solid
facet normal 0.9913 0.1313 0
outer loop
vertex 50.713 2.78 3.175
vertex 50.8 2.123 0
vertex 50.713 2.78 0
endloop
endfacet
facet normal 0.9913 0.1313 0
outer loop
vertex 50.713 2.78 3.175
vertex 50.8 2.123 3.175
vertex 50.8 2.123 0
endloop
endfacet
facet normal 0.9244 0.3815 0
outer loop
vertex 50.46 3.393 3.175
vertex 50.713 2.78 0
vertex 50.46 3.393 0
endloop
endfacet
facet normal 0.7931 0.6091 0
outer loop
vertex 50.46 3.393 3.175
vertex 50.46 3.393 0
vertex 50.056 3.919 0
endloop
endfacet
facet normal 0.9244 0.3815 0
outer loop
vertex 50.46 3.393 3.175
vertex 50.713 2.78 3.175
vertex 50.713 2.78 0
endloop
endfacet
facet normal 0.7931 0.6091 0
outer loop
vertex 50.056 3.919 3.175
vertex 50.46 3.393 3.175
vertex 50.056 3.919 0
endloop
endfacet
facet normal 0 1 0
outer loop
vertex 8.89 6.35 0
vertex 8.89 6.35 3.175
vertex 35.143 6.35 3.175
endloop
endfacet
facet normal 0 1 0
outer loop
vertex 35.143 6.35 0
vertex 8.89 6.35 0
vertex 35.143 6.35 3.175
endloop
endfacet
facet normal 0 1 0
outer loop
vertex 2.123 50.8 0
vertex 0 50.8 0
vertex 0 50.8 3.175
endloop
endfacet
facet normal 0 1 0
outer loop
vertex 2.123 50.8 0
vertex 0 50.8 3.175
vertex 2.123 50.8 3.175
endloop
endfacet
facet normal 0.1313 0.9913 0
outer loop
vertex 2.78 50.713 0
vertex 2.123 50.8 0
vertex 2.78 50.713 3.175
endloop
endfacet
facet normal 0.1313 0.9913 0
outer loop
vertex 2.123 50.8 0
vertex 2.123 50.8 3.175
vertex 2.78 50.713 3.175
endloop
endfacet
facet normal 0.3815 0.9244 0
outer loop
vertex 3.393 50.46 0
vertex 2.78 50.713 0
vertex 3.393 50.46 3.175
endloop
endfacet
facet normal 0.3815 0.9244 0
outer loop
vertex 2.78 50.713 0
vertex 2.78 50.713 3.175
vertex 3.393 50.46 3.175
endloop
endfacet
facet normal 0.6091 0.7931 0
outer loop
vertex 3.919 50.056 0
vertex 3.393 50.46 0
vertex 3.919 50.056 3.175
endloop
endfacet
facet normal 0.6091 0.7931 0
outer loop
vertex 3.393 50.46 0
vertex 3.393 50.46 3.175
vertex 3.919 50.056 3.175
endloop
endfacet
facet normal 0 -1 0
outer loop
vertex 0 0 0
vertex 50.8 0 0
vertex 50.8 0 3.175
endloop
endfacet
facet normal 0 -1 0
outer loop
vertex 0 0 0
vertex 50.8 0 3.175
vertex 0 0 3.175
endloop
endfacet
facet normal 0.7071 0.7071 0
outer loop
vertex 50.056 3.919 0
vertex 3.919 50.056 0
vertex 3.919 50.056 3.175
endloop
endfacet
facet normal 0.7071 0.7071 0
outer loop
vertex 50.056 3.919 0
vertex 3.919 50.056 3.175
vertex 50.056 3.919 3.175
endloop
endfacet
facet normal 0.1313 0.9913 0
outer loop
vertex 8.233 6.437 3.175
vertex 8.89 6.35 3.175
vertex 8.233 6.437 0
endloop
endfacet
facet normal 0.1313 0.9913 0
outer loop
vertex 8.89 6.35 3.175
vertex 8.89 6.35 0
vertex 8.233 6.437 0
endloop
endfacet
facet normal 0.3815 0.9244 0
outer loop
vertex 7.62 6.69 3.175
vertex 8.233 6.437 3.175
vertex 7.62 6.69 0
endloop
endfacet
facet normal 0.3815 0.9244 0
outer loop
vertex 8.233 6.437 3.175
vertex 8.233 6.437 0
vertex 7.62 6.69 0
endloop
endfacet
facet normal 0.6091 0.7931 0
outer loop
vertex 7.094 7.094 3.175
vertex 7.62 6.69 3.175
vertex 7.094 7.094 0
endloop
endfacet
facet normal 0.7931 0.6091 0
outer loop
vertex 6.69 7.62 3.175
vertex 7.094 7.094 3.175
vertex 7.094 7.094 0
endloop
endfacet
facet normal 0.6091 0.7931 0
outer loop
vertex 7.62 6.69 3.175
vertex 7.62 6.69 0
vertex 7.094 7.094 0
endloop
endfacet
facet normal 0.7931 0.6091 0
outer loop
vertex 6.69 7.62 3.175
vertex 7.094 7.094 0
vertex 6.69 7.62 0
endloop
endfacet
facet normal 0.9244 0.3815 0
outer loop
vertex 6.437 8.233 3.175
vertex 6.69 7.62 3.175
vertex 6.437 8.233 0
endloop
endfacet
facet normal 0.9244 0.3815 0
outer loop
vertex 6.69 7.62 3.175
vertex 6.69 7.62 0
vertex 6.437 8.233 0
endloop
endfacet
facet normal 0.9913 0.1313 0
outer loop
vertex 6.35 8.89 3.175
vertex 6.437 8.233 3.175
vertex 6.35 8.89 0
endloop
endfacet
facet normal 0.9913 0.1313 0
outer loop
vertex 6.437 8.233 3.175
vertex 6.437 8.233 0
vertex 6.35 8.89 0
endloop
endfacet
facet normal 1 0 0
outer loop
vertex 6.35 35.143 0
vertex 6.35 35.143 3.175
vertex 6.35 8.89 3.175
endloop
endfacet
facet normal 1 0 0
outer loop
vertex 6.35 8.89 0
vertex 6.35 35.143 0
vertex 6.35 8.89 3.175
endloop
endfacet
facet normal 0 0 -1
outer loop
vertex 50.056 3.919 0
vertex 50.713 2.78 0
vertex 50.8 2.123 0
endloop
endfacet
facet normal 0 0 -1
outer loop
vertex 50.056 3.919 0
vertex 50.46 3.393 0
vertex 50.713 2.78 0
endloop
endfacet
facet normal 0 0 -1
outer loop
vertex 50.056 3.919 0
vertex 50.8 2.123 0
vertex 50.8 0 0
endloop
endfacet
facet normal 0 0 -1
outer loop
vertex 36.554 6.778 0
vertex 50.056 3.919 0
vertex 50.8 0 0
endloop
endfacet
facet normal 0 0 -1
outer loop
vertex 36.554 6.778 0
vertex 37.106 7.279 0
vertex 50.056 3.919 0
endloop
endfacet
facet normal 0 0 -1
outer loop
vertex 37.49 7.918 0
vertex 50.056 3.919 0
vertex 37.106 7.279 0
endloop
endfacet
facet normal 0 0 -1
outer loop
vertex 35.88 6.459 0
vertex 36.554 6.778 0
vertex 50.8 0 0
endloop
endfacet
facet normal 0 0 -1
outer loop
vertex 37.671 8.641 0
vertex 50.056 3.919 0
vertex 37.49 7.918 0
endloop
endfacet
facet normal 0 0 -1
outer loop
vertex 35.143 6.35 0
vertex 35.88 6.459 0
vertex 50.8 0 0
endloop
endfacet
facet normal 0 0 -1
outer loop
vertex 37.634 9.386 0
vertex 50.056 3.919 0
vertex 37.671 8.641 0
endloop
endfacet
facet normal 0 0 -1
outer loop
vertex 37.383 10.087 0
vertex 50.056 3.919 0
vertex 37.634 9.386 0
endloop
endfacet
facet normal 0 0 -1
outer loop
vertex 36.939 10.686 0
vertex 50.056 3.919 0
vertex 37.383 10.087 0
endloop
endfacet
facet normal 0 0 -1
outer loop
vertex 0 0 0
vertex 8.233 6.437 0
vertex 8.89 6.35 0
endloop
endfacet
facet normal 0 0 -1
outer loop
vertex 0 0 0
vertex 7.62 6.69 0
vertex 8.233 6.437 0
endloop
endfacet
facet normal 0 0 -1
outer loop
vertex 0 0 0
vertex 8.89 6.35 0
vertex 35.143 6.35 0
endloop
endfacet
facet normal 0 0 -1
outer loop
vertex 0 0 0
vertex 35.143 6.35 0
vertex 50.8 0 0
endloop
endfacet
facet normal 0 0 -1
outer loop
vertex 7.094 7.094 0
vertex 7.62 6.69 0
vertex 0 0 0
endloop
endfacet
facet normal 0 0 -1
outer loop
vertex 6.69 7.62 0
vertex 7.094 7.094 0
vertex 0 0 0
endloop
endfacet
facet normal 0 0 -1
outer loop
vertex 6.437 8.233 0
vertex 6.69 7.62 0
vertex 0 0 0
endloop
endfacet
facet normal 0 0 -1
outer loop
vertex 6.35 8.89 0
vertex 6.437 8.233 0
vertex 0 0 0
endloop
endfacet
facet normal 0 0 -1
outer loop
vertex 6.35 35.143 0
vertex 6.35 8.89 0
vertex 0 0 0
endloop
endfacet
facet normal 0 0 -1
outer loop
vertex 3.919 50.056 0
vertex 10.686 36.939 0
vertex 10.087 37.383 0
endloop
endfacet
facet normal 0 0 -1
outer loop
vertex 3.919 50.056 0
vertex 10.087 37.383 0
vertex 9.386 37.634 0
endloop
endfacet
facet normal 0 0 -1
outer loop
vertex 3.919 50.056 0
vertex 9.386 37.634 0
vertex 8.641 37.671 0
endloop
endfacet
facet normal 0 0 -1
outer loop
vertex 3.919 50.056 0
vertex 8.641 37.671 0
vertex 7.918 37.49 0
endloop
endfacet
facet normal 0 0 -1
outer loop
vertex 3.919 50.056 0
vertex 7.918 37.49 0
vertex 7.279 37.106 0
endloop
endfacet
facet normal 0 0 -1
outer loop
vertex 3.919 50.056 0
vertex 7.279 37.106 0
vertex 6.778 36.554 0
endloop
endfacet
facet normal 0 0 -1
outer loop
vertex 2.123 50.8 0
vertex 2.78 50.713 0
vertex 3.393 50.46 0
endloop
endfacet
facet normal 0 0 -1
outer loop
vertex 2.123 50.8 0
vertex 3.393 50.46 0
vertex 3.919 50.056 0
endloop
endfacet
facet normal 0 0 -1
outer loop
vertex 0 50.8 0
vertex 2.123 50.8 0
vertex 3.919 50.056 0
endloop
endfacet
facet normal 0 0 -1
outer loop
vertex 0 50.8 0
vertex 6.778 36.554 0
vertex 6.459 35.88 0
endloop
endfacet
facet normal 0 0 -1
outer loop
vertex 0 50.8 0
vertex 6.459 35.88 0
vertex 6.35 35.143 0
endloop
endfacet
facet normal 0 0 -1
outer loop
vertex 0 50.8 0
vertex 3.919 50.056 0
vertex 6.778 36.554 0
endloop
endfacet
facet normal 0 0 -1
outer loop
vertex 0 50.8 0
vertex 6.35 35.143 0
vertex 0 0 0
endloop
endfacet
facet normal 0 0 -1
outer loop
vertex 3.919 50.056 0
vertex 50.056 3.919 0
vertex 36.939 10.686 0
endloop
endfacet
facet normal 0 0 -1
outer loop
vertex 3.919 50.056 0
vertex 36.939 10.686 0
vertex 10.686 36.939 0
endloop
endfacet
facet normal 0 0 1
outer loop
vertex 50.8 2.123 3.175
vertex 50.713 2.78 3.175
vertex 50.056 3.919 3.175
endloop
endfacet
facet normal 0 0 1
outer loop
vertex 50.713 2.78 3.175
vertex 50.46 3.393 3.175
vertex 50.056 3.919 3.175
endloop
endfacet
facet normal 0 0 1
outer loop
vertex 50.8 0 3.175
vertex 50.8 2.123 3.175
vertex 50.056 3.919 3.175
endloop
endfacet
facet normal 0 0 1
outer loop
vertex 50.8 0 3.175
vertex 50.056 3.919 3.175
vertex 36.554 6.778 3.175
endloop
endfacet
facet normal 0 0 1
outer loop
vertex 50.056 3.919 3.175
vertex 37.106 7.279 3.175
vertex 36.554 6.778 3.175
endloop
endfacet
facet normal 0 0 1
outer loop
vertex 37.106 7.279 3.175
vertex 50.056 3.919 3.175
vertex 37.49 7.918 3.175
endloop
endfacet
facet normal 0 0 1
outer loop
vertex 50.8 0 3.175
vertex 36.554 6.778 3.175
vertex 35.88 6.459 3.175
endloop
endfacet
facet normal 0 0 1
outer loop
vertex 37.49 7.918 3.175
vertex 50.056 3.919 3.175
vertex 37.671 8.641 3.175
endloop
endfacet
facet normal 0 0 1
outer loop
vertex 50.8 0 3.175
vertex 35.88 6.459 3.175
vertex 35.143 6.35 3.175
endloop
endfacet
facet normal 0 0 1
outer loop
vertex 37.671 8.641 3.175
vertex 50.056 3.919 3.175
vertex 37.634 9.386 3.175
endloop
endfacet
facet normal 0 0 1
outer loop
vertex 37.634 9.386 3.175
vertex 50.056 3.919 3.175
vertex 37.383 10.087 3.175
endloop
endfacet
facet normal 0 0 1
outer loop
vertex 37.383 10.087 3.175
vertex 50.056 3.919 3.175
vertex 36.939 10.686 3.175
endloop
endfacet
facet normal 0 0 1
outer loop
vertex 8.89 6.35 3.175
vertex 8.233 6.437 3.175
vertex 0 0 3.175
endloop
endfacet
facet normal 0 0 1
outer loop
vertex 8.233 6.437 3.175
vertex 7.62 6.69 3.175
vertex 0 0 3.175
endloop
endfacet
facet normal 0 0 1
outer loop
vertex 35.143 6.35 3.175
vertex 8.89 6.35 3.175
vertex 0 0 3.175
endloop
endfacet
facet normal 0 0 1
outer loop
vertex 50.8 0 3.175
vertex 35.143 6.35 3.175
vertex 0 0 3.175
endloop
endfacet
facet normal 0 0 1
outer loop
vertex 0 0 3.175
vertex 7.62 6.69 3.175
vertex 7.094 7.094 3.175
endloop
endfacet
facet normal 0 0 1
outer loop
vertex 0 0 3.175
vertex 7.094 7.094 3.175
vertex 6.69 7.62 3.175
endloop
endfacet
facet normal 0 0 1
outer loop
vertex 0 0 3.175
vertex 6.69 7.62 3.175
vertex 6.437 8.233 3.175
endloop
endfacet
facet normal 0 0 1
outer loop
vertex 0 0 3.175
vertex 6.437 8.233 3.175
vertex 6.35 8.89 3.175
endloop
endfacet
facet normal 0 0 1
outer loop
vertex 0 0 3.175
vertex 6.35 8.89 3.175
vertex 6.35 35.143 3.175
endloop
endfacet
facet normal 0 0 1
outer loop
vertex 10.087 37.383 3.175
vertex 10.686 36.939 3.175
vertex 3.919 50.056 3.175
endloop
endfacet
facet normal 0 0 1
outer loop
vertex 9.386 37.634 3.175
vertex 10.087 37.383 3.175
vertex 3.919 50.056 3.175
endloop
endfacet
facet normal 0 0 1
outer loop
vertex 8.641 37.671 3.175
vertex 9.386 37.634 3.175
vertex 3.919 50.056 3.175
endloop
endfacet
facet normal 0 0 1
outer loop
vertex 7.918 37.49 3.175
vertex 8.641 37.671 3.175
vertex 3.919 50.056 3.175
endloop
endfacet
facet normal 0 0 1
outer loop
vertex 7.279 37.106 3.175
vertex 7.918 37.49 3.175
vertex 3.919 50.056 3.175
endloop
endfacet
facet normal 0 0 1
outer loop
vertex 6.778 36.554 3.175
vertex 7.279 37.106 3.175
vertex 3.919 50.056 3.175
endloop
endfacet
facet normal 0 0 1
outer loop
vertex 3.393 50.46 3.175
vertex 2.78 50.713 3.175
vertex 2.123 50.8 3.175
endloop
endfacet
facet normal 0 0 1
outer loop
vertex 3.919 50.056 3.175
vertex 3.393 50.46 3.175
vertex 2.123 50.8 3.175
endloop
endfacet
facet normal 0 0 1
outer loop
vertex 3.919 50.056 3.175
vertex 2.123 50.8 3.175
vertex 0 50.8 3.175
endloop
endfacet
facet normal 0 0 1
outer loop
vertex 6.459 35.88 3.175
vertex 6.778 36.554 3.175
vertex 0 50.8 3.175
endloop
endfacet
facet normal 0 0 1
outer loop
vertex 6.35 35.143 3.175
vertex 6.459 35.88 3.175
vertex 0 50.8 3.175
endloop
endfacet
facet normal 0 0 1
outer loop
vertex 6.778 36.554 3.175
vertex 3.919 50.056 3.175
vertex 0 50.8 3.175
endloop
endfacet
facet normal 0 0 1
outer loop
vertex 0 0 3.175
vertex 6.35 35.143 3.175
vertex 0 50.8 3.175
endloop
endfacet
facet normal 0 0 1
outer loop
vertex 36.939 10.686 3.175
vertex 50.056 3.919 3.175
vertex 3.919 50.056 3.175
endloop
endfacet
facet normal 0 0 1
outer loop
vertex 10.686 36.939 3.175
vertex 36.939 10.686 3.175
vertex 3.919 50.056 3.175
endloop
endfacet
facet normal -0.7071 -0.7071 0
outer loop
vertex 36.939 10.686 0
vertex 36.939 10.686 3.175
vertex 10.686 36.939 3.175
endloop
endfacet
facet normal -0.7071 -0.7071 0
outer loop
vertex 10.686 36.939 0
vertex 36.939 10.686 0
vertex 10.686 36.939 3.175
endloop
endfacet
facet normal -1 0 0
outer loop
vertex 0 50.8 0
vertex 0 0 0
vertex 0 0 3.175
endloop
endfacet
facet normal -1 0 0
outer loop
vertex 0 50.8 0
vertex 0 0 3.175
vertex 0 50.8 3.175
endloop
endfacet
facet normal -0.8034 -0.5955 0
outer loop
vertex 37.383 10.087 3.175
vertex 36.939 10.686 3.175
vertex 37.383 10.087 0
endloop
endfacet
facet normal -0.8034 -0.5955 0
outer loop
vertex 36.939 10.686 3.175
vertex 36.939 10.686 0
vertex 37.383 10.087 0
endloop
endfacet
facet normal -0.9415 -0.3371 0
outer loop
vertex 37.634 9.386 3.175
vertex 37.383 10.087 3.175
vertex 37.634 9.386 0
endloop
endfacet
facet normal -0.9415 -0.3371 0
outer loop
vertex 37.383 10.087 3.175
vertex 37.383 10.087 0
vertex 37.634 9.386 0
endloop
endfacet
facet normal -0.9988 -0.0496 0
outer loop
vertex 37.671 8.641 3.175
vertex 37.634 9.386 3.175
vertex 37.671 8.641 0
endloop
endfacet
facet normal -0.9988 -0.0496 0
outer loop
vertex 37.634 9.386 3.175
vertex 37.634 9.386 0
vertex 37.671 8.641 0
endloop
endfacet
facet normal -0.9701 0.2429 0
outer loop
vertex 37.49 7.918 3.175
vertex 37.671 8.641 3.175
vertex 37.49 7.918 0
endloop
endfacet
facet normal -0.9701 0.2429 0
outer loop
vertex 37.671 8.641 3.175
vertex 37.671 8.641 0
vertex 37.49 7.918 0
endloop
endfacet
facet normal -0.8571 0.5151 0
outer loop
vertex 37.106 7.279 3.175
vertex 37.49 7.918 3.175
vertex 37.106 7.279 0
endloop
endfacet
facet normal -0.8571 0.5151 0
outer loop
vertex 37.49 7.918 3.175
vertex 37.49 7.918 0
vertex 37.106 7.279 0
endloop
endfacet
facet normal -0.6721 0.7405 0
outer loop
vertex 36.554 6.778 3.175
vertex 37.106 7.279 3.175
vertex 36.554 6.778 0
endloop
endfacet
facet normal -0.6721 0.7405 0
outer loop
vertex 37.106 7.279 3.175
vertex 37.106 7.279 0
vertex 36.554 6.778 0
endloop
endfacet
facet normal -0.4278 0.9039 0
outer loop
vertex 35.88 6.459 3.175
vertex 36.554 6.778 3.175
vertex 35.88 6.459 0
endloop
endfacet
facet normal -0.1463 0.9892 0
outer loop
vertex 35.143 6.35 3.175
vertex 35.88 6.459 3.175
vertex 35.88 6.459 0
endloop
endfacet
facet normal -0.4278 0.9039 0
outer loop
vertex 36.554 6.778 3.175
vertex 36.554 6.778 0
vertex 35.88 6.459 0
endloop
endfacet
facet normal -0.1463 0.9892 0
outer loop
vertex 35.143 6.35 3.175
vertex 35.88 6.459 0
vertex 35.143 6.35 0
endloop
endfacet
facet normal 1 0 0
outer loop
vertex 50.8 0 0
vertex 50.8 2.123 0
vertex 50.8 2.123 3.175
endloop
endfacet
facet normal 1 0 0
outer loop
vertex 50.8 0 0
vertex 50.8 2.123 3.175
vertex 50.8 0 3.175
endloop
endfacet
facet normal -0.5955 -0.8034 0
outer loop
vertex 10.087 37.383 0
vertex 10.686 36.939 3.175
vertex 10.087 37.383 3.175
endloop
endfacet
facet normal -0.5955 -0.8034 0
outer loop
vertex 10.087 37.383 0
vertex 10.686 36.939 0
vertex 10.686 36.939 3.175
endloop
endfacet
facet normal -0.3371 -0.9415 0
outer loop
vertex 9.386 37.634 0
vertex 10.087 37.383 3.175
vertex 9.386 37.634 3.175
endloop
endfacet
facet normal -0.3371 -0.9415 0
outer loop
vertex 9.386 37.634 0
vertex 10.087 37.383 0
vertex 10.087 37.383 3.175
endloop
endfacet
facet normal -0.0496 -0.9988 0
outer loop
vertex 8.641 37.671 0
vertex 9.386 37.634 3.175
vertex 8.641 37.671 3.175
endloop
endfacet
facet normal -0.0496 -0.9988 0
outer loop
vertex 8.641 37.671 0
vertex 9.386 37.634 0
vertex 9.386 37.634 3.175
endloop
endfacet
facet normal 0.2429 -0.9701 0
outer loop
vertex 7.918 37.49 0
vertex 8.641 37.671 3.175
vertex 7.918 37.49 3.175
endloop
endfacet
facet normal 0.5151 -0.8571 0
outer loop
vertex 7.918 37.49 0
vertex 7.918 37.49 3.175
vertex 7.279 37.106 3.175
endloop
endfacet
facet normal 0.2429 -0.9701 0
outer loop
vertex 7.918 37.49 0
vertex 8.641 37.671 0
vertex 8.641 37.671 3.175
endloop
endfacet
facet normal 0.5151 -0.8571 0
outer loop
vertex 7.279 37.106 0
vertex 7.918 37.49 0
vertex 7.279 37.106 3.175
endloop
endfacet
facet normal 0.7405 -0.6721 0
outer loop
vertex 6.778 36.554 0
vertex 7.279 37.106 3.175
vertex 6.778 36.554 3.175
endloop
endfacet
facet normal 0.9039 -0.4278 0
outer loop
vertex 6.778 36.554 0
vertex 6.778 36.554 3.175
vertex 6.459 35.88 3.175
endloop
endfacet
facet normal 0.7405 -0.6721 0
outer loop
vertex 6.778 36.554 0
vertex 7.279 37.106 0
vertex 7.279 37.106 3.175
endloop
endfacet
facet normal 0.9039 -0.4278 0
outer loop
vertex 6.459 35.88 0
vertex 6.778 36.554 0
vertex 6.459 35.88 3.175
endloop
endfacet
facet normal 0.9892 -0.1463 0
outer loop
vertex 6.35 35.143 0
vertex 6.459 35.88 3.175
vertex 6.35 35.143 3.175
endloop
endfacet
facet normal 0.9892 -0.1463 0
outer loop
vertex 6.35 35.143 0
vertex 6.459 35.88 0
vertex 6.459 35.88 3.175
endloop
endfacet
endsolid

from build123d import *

# Parameters (mm, degrees)
BOSS_EXTRUDE1_DEPTH = 3.175
CUT_EXTRUDE1_DEPTH  = 3.175
FILLET4_R           = 2.54
FILLET5_R           = 2.54


with BuildPart() as part:
    # Sketch1 → Boss-Extrude1 (new body)
    with BuildSketch(Plane.XY):
        Polygon((0, 0), (0, 50.8), (3.175, 50.8), (50.8, 3.175), (50.8, 0), align=None)
    extrude(amount=BOSS_EXTRUDE1_DEPTH)

    # Sketch7 → Cut-Extrude1 (cut)
    with BuildSketch(Plane.XY.offset(3.175)):
        Polygon((6.35, 41.275), (6.35, 6.35), (41.275, 6.35), align=None)
    extrude(amount=-CUT_EXTRUDE1_DEPTH, mode=Mode.SUBTRACT)

    # Fillet4
    fillet4_edges = [part.edges().sort_by_distance(p)[0] for p in [
        (50.8, 3.175, 1.5875),
        (3.175, 50.8, 1.5875),
    ]]
    fillet(fillet4_edges, radius=FILLET4_R)

    # Fillet5
    fillet5_edges = [part.edges().sort_by_distance(p)[0] for p in [
        (6.35, 6.35, 1.5875),
        (41.275, 6.35, 1.5875),
        (6.35, 41.275, 1.5875),
    ]]
    fillet(fillet5_edges, radius=FILLET5_R)


solid = part.part
